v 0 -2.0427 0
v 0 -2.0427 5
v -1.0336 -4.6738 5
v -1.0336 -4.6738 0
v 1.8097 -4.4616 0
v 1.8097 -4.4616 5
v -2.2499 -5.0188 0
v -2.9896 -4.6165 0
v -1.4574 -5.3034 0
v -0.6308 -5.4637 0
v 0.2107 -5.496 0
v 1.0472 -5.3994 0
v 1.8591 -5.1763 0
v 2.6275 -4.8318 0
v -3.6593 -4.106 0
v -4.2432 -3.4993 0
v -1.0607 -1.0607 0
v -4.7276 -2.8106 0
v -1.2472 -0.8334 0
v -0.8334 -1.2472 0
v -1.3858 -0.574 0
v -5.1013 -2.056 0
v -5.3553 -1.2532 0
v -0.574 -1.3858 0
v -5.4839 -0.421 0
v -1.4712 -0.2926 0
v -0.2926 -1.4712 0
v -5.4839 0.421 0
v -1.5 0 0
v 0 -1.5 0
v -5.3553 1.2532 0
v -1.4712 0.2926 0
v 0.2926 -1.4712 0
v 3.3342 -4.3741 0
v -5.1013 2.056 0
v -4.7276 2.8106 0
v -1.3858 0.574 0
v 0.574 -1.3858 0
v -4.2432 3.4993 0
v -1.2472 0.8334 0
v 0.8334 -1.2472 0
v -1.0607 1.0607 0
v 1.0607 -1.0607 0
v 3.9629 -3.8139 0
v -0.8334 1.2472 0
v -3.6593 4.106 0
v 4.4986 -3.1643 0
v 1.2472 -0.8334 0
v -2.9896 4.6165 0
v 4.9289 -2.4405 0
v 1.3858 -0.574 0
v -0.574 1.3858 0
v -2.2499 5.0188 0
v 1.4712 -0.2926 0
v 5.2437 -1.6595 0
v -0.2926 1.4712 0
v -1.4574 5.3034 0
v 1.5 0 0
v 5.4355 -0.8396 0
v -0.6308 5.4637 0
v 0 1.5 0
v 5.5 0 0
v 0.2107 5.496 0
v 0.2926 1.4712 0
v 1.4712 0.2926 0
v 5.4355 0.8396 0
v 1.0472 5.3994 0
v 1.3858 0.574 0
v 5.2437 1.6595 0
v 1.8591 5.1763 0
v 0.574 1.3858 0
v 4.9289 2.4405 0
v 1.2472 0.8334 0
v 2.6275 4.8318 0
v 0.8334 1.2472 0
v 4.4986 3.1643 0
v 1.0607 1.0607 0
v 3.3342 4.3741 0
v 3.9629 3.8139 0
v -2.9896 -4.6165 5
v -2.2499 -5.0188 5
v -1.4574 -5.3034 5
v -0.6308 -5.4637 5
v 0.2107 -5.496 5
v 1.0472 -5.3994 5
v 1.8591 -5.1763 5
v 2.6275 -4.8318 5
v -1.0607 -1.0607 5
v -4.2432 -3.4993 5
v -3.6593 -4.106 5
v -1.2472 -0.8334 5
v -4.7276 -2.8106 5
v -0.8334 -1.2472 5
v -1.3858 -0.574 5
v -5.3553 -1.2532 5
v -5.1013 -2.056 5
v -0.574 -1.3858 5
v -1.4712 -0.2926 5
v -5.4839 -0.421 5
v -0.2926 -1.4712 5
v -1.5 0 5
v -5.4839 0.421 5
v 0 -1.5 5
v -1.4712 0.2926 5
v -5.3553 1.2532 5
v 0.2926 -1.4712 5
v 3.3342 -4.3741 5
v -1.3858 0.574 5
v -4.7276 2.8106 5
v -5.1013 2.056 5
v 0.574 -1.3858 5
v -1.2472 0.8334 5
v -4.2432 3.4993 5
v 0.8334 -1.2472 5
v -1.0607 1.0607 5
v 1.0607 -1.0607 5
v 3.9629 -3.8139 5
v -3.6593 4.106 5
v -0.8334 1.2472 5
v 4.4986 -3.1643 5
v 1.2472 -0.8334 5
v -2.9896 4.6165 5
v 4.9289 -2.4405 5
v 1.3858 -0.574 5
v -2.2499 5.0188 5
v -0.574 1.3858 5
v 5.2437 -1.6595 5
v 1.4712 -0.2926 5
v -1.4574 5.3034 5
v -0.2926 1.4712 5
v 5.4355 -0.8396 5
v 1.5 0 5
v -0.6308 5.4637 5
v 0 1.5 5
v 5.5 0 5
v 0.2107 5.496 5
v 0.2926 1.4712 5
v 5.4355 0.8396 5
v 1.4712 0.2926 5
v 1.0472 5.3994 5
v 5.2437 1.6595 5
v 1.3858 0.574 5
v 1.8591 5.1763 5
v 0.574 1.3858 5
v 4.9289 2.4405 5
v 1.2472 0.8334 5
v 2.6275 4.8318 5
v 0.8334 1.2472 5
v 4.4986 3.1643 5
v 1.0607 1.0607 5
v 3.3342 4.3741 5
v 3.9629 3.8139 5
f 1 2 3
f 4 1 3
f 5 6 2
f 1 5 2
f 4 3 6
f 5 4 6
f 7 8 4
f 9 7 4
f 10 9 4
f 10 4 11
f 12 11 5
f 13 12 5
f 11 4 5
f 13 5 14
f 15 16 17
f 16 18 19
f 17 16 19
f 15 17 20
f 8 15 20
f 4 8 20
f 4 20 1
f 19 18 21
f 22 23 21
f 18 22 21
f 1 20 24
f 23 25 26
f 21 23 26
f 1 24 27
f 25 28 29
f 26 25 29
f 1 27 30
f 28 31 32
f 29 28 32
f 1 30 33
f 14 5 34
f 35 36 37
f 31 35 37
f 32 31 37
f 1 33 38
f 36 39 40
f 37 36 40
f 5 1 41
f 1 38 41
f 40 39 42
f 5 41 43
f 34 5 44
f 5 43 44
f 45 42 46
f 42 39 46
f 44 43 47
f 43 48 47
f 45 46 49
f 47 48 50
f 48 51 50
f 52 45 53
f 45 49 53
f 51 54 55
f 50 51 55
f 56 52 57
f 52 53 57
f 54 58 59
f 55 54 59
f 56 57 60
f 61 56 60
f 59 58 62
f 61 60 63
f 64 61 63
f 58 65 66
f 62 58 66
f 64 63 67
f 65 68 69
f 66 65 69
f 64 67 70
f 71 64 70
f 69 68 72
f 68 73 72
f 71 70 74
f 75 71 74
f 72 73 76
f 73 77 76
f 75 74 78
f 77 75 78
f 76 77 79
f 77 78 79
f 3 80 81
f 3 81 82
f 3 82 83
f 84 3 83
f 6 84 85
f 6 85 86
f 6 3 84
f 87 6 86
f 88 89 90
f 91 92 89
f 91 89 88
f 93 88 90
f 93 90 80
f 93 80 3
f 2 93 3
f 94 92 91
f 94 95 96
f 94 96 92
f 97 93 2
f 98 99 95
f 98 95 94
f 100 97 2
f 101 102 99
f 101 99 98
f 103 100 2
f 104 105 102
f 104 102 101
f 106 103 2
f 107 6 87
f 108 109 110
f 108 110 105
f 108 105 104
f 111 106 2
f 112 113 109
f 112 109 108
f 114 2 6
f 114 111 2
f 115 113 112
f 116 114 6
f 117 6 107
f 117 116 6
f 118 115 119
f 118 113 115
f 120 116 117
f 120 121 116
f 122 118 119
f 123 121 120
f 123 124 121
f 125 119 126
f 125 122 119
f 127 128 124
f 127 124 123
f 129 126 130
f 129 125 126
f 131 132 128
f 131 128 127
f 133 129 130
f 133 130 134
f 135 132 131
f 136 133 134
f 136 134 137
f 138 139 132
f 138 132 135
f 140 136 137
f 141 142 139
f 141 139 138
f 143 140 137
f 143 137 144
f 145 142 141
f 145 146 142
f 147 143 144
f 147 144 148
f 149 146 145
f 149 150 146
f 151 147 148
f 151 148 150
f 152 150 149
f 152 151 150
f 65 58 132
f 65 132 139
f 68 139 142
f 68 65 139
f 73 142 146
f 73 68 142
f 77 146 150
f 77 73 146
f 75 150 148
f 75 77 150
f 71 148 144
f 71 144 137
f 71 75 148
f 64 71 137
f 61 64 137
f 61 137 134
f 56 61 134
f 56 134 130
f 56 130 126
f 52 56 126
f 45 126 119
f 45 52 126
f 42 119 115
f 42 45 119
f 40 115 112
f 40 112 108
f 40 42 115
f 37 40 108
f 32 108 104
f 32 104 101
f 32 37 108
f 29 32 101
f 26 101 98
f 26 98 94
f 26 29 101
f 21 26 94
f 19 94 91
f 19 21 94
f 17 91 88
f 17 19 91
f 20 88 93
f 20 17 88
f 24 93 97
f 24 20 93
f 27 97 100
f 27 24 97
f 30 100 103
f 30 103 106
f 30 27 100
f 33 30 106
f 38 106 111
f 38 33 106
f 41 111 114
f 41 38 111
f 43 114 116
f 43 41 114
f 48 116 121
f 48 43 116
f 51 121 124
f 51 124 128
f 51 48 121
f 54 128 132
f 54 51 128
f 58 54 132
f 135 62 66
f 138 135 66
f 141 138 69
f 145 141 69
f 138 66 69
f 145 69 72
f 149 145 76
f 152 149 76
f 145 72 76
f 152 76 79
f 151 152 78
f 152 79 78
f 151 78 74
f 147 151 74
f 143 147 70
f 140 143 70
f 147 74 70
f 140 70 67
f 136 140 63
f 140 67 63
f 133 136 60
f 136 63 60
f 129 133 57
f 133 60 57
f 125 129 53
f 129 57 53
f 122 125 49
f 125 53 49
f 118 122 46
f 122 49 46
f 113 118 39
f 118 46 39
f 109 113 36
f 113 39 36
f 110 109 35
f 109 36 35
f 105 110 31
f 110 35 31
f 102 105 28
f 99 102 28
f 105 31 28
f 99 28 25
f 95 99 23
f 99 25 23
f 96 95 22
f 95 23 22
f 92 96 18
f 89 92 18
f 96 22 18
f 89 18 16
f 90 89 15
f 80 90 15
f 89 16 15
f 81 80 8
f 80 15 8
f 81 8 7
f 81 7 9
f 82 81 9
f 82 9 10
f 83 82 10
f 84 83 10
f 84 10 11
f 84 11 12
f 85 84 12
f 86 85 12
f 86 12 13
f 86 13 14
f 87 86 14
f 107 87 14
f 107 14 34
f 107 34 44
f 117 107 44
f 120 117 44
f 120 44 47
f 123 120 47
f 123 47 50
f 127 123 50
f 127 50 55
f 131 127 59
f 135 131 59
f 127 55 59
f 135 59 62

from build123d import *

# Parameters (mm, degrees)
F0_R     = 5.5
F0_R_2   = 1.5
F1_DEPTH = 5
F3_DEPTH = 5


with BuildPart() as f1:
    # F0 (on Top) → F1 (new body)
    with BuildSketch(Plane.XY):
        Circle(F0_R)
        Circle(F0_R_2, mode=Mode.SUBTRACT)
    extrude(amount=F1_DEPTH)

    # F2 (on face) → F3 (cut)
    with BuildSketch(Plane.XY.offset(5)):
        Polygon((1.809749, -4.461624), (0, -2.042668), (-1.033585, -4.673813), align=None)
    extrude(amount=-F3_DEPTH, mode=Mode.SUBTRACT)


solid = f1.part
